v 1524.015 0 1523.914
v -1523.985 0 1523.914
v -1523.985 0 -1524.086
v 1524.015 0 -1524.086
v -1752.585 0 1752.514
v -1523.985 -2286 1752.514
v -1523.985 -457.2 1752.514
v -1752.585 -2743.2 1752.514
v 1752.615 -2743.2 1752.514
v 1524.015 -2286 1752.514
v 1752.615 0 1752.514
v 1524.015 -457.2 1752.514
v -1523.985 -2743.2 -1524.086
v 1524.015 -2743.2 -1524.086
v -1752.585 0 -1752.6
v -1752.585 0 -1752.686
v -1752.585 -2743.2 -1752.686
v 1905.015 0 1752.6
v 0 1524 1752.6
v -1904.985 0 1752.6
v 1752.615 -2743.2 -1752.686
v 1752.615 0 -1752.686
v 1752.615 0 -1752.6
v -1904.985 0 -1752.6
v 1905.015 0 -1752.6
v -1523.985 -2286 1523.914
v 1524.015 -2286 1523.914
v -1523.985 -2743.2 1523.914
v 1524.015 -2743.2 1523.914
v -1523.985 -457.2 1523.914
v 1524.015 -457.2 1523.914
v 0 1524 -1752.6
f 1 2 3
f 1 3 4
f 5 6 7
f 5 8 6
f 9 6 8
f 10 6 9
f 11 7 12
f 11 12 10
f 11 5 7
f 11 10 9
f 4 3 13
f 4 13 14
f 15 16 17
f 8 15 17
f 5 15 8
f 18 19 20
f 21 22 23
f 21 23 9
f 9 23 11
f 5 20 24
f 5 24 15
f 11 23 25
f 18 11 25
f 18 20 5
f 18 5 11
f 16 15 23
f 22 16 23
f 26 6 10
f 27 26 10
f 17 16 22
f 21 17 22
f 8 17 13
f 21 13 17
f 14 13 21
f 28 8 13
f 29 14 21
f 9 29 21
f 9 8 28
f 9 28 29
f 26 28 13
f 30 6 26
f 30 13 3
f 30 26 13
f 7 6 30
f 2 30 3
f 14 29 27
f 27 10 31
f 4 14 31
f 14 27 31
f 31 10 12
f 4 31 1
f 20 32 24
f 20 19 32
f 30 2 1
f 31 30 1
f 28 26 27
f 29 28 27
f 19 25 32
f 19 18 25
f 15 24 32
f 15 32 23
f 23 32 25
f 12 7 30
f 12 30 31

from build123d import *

# Parameters (mm, degrees)
F0_W     = 3505.2
F0_H     = 3505.2
F0_W_2   = 3048
F0_H_2   = 3048
F1_DEPTH = 2743.2
F3_DEPTH = 1752.6
F4_W     = 3048
F4_H     = 1828.8
F5_DEPTH = 304.8


with BuildPart() as f1:
    # F0 (on Front) → F1 (new body)
    with BuildSketch(Plane.XZ):
        with Locations((0.014618, -0.085812)):
            Rectangle(F0_W, F0_H)
        with Locations((0.014618, -0.085812)):
            Rectangle(F0_W_2, F0_H_2, mode=Mode.SUBTRACT)
    extrude(amount=F1_DEPTH)

    # F2 (on Top) → F3 (join, symmetric)
    with BuildSketch(Plane.XY):
        Polygon((0, 1524), (-1904.985382, 0), (1905.014618, 0), align=None)
    extrude(amount=F3_DEPTH, both=True)

    # F4 (on face) → F5 (cut)
    with BuildSketch(Plane.XY.offset(1752.514188)):
        with Locations((0.014618, -1371.6)):
            Rectangle(F4_W, F4_H)
    extrude(amount=-F5_DEPTH, mode=Mode.SUBTRACT)


solid = f1.part
